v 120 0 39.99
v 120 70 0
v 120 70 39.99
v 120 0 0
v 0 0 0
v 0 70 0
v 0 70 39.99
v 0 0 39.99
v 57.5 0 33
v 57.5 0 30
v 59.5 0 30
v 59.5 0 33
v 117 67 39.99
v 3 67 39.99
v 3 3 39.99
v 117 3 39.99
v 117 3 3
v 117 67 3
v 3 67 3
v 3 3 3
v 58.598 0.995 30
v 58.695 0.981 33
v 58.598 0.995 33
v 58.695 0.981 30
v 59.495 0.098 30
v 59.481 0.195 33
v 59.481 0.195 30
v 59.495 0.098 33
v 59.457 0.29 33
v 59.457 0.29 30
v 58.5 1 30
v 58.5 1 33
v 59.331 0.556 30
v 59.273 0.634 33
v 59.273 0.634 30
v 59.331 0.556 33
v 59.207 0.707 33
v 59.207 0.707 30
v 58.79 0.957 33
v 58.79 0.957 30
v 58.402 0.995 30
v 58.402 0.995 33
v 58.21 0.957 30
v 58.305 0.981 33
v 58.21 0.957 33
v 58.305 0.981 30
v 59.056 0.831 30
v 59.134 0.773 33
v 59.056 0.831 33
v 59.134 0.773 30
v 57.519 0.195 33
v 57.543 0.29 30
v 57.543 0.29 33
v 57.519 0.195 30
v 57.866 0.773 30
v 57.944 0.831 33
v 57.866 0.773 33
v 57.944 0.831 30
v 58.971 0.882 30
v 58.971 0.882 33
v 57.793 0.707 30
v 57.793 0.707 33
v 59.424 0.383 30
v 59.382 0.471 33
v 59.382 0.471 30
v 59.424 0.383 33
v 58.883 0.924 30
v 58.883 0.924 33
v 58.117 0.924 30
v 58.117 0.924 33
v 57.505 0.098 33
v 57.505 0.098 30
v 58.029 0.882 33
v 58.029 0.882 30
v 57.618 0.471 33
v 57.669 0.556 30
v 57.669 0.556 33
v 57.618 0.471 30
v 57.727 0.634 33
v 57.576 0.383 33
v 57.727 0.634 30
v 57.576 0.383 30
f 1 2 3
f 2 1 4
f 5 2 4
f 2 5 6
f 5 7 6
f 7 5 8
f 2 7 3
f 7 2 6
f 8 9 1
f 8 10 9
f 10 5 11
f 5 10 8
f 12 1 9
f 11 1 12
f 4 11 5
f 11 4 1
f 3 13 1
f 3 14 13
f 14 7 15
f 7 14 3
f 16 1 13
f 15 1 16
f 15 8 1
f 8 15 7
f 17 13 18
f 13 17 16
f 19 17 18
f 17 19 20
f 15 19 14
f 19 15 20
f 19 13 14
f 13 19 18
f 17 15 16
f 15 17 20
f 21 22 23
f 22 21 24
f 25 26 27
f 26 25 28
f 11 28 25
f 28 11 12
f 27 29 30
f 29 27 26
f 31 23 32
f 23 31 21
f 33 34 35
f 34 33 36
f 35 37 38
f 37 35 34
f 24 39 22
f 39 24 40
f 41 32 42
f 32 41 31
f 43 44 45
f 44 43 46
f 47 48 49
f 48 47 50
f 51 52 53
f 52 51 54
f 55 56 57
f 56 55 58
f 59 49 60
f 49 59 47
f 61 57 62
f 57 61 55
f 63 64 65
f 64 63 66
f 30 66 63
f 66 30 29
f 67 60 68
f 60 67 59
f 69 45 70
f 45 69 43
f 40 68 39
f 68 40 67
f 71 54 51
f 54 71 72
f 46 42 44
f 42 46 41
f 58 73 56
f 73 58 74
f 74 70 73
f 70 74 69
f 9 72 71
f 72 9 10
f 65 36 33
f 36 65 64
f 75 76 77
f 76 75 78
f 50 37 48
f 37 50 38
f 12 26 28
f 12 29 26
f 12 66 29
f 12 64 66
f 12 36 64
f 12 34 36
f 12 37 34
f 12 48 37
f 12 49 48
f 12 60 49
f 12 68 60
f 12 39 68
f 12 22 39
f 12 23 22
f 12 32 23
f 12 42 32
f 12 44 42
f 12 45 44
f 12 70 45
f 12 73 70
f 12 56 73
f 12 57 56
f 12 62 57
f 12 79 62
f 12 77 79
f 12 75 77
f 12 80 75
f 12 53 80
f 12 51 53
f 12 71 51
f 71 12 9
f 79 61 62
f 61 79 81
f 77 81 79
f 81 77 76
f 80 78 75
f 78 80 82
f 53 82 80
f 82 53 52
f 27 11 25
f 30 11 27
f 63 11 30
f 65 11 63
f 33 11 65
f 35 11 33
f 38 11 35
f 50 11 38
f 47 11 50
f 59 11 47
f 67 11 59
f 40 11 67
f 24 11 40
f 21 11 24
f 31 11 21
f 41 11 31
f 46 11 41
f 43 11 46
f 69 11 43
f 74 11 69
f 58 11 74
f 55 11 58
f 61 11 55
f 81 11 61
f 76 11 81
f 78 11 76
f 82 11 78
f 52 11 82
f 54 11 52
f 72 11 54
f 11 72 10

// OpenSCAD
// Buffer Tank for Mini Horizontal Gel Electrophoresis
// Units: millimetres

// Outer Dimensions
$w_outer = 120; // X width
$d_outer = 70;  // Y depth
$h_outer = 40;  // Z height

// Wall and Floor Thickness
$wall_thick = 3;
$floor_thick = 3;

// Platform Dimensions
$plat_len = 60;   // Length in X
$plat_width = $d_outer; // Spans full outer width (effectively inner width + walls)
$plat_height = 10; // Height above inner floor

// Hole Dimensions
$hole_dia = 2;
$hole_y = 0;
$hole_z = 30;

// Configuration
$fn = 64;

// Derived Dimensions
$inner_w = $w_outer - 2*$wall_thick;
$inner_d = $d_outer - 2*$wall_thick;
$inner_h = $h_outer - $floor_thick;
$plat_z_top = $floor_thick + $plat_height;

// Main Tank Construction
difference() {
    // 1. Create the solid outer block
    translate([0, 0, 0])
    cube([$w_outer, $d_outer, $h_outer], center=false);

    // 2. Cut the top opening (open-top tank)
    // Cut slightly below the top surface to ensure clean edges
    translate([0, 0, $h_outer - 0.01])
    cube([$w_outer, $d_outer, 1], center=false);

    // 3. Cut the main internal cavity (the empty space for buffer)
    // This block represents the void inside the tank walls and above the floor.
    // Position: Starts at inner wall coordinates, goes up to the top of the walls.
    translate([$wall_thick, $wall_thick, $floor_thick])
    cube([$inner_w, $inner_d, $inner_h], center=false);

    // 4. Cut the Platform Void
    // The platform is a solid object inside the tank. We must subtract its volume.
    // Position:
    // X: Centered ($w_outer/2 - $plat_len/2)
    // Y: Spans the full inner width ($wall_thick to $d_outer - $wall_thick)
    // Z: From the top of the floor ($floor_thick) to the top of the platform ($plat_z_top)
    translate([
        ($w_outer - $plat_len)/2, 
        $wall_thick, 
        $floor_thick
    ])
    cube([$plat_len, $inner_d, $plat_height], center=false);

    // 5. Cut Electrode Holes
    // Drill 2mm diameter holes through the end walls at y=0, z=30 along X axis.
    // The hole goes through the wall thickness.
    
    // Left Hole (at negative X end)
    // Center X is at the inner face of the left wall? 
    // No, the hole is in the "end wall". The end wall is at X = +/- ($w_outer/2 - $wall_thick/2).
    // The hole is horizontal along X, so it passes through the wall thickness.
    // Center X = +/- ($w_outer/2 - $wall_thick/2)
    // Center Y = $hole_y (0)
    // Center Z = $hole_z (30)
    // Length = $wall_thick (to go through the wall)
    
    // Left Hole
    translate([
        -$w_outer/2 + $wall_thick/2, 
        $hole_y,
        $hole_z
    ])
    cylinder(h=$wall_thick, r=$hole_dia/2, $fn=$fn);
    
    // Right Hole
    translate([
        $w_outer/2 - $wall_thick/2, 
        $hole_y,
        $hole_z
    ])
    cylinder(h=$wall_thick, r=$hole_dia/2, $fn=$fn);
}
